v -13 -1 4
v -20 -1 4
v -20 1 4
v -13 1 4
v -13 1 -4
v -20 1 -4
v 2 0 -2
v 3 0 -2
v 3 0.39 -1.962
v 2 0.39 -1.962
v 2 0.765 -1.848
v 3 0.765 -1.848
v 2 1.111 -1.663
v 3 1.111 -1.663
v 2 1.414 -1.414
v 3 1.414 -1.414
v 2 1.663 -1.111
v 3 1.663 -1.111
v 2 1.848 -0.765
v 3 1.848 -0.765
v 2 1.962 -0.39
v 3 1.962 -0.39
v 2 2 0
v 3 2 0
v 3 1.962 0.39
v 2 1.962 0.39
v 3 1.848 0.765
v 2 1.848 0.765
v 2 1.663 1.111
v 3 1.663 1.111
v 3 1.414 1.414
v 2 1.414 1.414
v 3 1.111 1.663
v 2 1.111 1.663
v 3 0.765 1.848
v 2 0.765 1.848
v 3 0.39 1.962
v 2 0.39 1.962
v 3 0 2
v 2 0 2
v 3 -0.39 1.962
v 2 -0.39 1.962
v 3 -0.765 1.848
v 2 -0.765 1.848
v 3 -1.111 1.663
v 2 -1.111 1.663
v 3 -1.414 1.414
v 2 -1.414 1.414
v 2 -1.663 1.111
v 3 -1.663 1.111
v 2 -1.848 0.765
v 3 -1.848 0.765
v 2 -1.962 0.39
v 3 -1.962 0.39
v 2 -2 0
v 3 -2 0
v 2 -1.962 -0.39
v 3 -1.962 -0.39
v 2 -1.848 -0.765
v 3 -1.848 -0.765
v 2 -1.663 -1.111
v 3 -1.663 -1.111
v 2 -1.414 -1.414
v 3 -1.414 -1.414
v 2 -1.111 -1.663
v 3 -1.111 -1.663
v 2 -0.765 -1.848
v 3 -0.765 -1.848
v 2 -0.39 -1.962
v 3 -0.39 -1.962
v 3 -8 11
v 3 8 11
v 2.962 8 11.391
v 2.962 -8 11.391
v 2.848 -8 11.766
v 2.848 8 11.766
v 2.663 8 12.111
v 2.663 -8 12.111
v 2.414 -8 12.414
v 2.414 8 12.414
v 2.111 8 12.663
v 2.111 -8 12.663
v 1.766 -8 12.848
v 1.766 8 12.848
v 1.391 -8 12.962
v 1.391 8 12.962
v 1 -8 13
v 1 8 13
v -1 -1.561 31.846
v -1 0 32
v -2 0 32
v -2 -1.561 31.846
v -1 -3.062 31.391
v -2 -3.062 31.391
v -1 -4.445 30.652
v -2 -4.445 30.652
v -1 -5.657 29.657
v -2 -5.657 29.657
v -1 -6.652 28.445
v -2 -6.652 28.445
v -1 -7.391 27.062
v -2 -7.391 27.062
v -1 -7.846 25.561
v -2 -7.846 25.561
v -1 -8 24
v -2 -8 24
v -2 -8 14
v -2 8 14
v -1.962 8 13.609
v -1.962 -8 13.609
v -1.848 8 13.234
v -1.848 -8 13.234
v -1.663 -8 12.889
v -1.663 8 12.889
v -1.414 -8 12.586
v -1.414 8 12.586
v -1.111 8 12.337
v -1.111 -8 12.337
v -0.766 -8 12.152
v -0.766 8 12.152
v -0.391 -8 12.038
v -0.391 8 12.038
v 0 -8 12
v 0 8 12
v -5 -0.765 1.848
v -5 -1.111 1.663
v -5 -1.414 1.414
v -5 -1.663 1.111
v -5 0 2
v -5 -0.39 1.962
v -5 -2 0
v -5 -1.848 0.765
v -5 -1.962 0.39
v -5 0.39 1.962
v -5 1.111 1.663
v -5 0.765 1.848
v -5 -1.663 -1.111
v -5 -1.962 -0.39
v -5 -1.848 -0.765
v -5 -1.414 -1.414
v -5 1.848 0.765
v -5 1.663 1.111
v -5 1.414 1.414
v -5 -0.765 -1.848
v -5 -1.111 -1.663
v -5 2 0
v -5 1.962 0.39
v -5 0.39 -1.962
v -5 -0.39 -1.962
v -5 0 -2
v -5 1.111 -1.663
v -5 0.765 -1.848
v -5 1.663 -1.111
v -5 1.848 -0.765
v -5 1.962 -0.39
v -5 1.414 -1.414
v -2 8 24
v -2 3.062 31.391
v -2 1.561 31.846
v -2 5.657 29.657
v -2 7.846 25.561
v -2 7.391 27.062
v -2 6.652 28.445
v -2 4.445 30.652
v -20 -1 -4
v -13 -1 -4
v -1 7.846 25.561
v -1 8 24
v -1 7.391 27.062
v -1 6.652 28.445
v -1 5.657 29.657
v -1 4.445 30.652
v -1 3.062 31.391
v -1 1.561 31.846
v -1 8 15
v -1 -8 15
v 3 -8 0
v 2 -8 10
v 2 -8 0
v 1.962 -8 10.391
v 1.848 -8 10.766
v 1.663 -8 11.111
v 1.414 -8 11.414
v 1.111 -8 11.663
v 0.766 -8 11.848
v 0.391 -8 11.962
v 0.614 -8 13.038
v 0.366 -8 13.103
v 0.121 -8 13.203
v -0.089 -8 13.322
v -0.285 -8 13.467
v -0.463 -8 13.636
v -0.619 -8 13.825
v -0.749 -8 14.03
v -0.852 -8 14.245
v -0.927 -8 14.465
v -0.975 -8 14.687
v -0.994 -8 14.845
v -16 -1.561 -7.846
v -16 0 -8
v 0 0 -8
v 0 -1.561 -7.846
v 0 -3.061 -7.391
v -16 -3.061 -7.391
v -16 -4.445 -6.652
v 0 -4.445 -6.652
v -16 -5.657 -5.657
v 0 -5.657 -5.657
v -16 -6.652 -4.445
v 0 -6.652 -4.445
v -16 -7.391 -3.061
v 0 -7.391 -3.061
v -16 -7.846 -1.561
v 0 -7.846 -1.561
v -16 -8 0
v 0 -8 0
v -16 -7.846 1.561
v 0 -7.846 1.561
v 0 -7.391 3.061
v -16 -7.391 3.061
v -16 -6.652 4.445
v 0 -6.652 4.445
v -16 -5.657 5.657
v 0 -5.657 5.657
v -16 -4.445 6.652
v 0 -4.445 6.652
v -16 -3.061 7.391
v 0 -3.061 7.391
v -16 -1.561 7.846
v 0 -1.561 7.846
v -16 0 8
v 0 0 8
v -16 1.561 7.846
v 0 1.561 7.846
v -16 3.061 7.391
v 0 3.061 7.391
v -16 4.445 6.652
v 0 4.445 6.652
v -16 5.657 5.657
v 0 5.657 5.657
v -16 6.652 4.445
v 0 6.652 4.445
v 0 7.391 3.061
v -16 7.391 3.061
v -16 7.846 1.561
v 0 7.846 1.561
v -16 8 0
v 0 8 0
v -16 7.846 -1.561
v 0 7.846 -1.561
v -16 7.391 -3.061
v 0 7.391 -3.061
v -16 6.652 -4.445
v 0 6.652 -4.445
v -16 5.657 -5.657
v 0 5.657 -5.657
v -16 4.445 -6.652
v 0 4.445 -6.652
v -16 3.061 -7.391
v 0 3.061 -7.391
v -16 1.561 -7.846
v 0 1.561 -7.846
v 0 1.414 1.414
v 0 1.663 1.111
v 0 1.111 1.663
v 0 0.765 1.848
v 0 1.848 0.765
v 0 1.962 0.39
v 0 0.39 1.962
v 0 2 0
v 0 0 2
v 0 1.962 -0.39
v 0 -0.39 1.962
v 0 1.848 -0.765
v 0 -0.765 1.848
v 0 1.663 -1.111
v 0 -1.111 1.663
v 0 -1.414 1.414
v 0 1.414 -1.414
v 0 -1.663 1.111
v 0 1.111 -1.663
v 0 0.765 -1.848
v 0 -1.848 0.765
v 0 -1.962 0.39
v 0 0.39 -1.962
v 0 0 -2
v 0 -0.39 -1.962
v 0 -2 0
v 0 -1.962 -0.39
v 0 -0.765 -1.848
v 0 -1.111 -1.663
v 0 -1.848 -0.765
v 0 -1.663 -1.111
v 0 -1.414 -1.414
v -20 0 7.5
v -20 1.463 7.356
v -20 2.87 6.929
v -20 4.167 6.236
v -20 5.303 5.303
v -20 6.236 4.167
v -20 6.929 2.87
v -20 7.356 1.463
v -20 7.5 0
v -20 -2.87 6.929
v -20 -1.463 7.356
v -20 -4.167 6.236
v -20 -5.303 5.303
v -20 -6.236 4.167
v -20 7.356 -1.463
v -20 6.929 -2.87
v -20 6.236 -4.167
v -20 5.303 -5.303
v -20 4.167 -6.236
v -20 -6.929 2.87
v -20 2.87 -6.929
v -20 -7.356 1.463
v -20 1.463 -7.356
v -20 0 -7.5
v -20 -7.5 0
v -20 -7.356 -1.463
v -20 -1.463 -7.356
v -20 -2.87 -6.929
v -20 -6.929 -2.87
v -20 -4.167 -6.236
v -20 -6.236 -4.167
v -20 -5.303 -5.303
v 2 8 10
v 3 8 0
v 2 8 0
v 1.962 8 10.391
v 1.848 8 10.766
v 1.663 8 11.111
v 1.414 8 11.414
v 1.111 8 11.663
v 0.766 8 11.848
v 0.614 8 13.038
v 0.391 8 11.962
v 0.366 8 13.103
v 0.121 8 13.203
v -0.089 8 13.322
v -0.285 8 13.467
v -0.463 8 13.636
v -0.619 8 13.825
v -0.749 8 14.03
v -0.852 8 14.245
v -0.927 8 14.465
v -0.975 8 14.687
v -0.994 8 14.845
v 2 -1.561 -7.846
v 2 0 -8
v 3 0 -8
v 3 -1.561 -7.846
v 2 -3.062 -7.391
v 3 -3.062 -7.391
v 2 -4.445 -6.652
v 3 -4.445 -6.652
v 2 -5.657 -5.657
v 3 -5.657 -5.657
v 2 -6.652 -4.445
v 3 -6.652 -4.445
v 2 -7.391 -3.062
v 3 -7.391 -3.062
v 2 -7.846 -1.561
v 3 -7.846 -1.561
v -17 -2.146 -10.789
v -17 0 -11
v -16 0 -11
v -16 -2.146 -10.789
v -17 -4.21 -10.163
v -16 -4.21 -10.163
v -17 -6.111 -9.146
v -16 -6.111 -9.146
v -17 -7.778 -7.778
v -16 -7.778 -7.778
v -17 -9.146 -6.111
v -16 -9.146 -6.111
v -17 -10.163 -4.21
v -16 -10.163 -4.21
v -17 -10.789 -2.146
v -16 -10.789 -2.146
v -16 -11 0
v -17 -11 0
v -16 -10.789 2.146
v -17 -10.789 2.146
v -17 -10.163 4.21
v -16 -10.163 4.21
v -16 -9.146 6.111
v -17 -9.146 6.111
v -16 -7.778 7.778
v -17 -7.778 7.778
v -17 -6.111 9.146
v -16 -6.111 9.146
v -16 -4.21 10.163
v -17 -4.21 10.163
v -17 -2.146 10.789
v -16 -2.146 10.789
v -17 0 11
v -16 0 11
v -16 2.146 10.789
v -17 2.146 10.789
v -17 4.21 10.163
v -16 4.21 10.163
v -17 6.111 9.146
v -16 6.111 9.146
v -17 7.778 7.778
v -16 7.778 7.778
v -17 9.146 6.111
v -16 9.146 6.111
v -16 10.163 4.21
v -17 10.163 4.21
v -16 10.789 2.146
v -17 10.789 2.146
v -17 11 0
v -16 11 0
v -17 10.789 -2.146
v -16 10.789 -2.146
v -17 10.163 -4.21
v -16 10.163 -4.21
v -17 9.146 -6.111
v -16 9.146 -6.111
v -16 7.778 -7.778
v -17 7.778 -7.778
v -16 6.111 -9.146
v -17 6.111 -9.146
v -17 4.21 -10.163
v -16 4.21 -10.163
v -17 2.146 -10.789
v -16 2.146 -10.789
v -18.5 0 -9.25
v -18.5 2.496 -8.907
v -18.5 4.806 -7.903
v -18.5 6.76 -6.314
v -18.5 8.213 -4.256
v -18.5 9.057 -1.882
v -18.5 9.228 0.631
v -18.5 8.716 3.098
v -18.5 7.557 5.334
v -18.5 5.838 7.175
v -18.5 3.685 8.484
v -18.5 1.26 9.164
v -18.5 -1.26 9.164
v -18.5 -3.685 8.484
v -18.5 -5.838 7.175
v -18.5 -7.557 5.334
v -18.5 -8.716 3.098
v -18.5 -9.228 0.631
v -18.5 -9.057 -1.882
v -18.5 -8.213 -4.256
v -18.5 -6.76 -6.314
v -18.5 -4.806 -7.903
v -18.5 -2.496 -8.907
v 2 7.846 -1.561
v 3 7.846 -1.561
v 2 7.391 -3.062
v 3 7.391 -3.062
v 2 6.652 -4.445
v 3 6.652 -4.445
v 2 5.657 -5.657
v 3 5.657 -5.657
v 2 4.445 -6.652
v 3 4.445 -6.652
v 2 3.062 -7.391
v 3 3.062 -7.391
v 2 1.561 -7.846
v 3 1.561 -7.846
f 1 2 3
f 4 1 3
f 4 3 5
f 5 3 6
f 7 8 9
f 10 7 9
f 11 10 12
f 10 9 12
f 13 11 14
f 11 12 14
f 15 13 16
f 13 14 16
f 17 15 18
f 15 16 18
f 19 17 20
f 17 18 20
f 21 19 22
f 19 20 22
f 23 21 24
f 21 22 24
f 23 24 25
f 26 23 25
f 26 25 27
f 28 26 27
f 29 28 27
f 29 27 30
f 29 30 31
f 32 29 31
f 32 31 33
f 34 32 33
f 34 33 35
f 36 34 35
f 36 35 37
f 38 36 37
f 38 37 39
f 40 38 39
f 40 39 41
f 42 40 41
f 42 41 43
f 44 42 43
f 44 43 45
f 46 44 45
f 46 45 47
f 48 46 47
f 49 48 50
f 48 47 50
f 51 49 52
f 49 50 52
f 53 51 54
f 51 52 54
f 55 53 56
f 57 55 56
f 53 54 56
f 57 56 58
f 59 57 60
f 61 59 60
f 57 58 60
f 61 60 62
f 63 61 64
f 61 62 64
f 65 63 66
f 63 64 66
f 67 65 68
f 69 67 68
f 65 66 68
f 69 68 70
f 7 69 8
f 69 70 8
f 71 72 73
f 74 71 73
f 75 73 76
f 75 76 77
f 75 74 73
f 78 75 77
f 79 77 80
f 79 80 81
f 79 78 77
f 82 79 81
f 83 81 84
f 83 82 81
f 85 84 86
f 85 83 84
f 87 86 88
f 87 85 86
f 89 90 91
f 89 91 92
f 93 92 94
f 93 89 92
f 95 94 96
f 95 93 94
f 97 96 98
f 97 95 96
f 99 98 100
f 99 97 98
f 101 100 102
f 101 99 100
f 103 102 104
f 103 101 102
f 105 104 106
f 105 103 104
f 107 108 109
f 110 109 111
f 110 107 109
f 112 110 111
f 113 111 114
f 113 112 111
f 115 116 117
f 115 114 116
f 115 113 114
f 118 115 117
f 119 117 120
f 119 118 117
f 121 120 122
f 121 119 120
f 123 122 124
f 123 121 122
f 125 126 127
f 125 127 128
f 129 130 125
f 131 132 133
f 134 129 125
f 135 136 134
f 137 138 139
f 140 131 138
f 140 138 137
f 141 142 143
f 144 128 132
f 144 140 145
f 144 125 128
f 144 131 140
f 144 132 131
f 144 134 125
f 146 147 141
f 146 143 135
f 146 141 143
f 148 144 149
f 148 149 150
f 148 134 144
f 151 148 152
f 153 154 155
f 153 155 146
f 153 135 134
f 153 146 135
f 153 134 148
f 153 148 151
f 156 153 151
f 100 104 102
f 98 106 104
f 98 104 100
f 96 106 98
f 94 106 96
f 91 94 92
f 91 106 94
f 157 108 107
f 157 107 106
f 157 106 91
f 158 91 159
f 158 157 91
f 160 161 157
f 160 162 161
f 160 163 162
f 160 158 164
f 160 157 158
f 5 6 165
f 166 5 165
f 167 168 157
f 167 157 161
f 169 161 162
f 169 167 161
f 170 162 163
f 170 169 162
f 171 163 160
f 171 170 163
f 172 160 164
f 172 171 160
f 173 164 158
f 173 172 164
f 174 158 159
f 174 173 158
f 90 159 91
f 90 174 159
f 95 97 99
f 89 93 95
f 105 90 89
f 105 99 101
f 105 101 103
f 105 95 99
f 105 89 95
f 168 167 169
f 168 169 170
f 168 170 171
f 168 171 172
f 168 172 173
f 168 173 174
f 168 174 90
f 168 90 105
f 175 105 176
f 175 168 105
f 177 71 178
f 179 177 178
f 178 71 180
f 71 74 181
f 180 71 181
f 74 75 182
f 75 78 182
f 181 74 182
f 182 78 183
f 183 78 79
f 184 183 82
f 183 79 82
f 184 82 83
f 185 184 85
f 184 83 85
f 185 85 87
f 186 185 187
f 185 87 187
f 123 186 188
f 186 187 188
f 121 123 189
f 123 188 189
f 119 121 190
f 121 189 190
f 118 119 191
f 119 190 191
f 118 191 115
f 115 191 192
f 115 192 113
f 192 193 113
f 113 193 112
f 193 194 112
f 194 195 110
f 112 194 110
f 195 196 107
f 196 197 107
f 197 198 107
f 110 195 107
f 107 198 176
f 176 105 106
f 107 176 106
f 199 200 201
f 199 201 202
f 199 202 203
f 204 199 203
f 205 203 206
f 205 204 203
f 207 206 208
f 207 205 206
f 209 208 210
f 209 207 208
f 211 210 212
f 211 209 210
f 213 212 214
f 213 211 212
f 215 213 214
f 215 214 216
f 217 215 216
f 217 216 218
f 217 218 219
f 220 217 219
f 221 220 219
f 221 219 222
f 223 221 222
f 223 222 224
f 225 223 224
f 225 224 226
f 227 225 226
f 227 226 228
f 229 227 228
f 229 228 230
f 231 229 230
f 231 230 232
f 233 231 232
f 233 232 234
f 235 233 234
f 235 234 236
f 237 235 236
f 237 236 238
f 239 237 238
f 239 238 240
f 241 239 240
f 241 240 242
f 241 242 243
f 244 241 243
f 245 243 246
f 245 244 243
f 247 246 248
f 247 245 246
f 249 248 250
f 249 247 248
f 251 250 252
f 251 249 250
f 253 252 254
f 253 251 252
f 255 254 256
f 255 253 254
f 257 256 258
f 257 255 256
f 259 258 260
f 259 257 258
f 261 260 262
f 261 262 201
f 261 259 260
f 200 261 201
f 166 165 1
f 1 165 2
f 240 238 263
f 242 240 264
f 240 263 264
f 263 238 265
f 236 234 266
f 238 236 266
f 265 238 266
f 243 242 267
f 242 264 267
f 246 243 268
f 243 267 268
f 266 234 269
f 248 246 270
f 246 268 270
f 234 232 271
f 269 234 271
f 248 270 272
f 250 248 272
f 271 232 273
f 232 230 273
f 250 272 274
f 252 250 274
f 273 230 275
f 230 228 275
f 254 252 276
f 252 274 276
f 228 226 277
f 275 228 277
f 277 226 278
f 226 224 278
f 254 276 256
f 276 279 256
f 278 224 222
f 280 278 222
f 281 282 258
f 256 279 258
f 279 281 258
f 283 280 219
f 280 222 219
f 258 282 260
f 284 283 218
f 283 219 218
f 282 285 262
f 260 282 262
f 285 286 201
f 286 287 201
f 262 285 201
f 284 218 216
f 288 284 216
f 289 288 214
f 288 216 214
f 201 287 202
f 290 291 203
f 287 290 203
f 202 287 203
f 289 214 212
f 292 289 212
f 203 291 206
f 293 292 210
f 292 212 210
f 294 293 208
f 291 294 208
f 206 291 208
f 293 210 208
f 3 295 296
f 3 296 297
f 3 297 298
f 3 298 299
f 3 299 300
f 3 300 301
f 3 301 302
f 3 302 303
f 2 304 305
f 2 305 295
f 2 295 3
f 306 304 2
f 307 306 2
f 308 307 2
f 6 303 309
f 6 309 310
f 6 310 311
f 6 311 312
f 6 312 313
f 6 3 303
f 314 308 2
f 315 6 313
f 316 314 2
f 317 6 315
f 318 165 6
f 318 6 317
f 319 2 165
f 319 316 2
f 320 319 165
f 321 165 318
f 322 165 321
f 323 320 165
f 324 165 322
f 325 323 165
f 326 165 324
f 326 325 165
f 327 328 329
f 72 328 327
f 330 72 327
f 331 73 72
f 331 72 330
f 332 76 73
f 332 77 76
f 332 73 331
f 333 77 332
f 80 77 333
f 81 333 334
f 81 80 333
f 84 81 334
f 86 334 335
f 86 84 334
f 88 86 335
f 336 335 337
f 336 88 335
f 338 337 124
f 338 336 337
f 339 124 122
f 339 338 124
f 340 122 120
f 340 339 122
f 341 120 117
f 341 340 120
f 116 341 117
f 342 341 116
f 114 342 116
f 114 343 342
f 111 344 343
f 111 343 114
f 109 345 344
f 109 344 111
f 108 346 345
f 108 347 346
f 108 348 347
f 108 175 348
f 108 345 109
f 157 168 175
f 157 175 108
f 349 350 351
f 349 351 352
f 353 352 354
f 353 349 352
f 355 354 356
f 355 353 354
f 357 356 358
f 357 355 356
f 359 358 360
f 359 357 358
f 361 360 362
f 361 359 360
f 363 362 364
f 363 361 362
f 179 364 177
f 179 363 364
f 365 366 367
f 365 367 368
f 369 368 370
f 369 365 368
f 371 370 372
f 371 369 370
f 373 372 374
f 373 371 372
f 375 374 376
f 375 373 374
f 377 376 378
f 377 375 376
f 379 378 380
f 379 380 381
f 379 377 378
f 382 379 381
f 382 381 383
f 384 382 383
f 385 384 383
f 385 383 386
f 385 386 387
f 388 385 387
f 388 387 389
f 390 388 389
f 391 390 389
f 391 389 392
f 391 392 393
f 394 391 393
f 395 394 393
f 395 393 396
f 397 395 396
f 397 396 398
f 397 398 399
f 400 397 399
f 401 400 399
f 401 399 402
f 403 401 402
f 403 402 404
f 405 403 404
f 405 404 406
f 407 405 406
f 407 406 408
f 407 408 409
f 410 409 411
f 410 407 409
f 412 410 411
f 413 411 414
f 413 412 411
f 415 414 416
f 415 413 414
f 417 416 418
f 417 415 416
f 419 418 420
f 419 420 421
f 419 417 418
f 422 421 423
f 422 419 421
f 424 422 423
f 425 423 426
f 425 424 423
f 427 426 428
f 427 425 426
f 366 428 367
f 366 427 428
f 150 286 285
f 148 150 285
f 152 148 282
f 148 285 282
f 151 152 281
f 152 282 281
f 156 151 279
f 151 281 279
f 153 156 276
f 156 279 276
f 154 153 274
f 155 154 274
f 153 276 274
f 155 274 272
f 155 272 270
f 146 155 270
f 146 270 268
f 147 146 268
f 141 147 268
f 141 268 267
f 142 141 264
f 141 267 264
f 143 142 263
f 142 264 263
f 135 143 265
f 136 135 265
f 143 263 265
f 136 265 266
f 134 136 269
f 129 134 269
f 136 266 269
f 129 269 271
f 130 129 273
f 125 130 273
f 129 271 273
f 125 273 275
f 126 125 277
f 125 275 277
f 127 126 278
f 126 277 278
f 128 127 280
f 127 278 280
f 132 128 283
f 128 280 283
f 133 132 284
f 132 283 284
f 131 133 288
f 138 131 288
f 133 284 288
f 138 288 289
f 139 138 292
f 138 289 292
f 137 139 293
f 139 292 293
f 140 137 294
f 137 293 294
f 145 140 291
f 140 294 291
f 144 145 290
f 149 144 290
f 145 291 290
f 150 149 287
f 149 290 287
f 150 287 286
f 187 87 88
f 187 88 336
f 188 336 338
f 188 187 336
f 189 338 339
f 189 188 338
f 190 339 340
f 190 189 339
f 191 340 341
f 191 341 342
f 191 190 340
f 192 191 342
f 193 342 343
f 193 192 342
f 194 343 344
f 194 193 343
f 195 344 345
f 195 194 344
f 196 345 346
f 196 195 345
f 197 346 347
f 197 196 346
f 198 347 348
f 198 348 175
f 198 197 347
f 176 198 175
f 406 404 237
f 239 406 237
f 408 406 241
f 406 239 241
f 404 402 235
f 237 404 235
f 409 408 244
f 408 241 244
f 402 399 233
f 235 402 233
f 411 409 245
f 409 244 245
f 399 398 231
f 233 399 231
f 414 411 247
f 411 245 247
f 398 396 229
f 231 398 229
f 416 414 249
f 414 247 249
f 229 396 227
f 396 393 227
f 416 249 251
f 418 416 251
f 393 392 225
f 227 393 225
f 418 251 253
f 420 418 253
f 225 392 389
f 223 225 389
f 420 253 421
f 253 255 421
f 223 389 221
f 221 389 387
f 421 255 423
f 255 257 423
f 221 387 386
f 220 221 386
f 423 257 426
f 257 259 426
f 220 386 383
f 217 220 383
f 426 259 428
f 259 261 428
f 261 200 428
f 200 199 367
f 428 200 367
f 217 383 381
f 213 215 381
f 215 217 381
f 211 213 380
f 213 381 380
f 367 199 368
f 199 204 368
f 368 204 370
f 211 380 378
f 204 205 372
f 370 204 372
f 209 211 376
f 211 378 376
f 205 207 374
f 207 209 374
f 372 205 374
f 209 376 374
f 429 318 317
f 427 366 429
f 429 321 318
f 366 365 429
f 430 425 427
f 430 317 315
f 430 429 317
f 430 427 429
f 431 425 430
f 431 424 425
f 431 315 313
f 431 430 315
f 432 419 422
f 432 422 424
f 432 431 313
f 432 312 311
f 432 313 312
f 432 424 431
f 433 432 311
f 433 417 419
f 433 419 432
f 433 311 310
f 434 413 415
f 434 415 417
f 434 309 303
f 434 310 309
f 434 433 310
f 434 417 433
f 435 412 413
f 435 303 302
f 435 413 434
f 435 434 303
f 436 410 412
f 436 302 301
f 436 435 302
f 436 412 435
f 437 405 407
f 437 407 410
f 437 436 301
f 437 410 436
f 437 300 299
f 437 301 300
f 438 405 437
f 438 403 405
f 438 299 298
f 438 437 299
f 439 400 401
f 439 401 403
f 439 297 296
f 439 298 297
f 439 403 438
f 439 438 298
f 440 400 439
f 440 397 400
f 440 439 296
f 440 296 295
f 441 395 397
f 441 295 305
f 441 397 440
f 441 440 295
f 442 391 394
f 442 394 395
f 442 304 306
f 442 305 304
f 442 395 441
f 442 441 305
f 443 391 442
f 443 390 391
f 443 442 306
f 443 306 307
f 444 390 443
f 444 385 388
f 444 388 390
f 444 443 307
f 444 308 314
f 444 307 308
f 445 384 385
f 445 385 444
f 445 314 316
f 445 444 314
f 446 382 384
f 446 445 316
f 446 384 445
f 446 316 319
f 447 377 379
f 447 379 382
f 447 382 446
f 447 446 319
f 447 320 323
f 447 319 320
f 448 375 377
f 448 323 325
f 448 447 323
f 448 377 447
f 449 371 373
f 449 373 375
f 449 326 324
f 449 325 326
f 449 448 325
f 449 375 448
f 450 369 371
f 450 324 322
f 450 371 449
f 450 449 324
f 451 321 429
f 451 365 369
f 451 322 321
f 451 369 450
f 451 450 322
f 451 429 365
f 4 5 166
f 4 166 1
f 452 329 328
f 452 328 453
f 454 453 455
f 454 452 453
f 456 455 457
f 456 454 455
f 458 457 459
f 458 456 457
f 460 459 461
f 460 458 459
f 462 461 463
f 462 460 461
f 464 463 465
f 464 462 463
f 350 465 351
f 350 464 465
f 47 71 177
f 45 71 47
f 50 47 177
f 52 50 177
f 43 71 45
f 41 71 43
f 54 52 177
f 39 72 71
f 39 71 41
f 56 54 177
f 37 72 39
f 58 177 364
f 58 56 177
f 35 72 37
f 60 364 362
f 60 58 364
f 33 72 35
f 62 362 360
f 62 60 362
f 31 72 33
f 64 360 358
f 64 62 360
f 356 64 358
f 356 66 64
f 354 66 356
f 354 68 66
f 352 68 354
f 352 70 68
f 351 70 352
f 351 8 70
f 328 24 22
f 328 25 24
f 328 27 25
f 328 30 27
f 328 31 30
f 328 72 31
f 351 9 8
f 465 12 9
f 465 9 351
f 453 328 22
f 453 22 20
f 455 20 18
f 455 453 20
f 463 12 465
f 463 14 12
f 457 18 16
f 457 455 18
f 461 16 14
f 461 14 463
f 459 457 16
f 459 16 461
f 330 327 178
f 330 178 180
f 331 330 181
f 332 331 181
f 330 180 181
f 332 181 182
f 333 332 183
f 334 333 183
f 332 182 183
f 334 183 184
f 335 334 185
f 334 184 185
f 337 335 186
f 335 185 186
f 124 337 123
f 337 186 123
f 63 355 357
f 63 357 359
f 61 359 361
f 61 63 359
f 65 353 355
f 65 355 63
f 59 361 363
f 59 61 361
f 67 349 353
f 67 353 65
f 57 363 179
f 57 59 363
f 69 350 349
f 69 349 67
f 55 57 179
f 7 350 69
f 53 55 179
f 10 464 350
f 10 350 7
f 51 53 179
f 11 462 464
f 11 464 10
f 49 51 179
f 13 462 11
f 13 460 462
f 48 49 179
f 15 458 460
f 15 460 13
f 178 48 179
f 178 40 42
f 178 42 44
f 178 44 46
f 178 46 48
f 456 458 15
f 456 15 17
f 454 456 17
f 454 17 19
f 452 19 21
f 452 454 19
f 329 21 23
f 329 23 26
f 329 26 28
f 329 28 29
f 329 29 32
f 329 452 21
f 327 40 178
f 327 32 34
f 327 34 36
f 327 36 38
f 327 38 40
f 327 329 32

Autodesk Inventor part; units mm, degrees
ref_plane "YZ Plane" through (0, 0, 0) normal (1, 0, 0) x (0, 1, 0)
ref_plane "XZ Plane" through (0, 0, 0) normal (0, 1, 0) x (-1, 0, 0)
ref_plane "XY Plane" through (0, 0, 0) normal (0, 0, 1) x (1, 0, 0)
sketch "Эскиз1" plane through (0, 0, 0) normal (0, 1, 0) x (-1, 0, 0)
  line L0 (0, 0) -> (0, -8)
  line L1 (0, -8) -> (16, -8)
  line L2 (16, -8) -> (16, -11)
  line L3 (16, -11) -> (17, -11)
  line L4 (17, 0) -> (20, 0)
  line L5 (20, 0) -> (20, -7.5)
  line L6 (20, -7.5) -> (17, -11)
  line L7 (0, 0) -> (17, 0)
  dimension "d0" = 8
  dimension "d1" = 16
  dimension "d2" = 3
  dimension "d3" = 1
  dimension "d4" = 3
  dimension "d5" = 7.5
revolve "Вращение1" add sketch "Эскиз1" angle 360 about axis through (0, 0, 0) along (-1, 0, 0)
sketch "Эскиз2" plane through (0, 0, 0) normal (1, 0, 0) x (0, 0, -1)
  circle A0 centre (0, 0) radius 8 projected
  point P0 (0, 8)
ref_plane "РабПлоскость1" through (0, 8, 0) normal (0, 1, 0) x (-1, 0, 0)
sketch "Эскиз3" plane through (0, 8, 0) normal (0, 1, 0) x (-1, 0, 0)
  line L0 (0, -8) -> (16, -8) projected
  line L1 (0, -8) -> (-1, -8)
  line L2 (-1, -8) -> (-2, -8)
  line L3 (-2, -8) -> (-2, 12)
  line L4 (-2, 12) -> (2, 12)
  line L5 (2, 12) -> (2, 32)
  line L6 (2, 32) -> (1, 32)
  line L7 (1, 32) -> (1, 14)
  line L8 (1, 14) -> (1, 13)
  line L9 (1, 13) -> (-3, 13)
  line L10 (-3, 13) -> (-3, -8)
  line L11 (-3, -8) -> (-2, -8)
  point P0 (0, 0)
  dimension "d7" = 1
  dimension "d8" = 1
  dimension "d9" = 20
  dimension "d10" = 4
  dimension "d11" = 20
  dimension "d12" = 1
  dimension "d13" = 18
  dimension "d14" = 1
  dimension "d15" = 4
extrude "Выдавливание1" add sketch "Эскиз3" against normal blind 16
fillet "Сопряжение1" radius 2 2 edges at (-1, 0, 13) (3, 0, 13)
fillet "Сопряжение2" radius 2 2 edges at (-2, 0, 12) (2, 0, 12)
fillet "Сопряжение3" radius 8 4 edges at (2.5, 8, -8) (2.5, -8, -8) (-1.5, 8, 32) (-1.5, -8, 32)
sketch "Эскиз4" plane through (3, -8, 11) normal (1, 0, 0) x (0, 0, -1)
  circle A0 centre (11, 8) radius 2
  dimension "d21" = 4
extrude "Выдавливание2" cut sketch "Эскиз4" against normal blind 8
sketch "Эскиз5" plane through (-20, 0, 0) normal (-1, 0, 0) x (0, 0, 1)
  line L0 (0, 0) -> (4, 0)
  line L1 (4, 0) -> (4, 1)
  line L2 (4, 1) -> (-4, 1)
  line L3 (-4, 1) -> (-4, -1)
  line L4 (-4, -1) -> (4, -1)
  line L5 (4, -1) -> (4, 0)
  dimension "d24" = 4
  dimension "d25" = 1
  dimension "d26" = 8
  dimension "d27" = 2
extrude "Выдавливание3" cut sketch "Эскиз5" against normal blind 7
properties part number "Замок"
